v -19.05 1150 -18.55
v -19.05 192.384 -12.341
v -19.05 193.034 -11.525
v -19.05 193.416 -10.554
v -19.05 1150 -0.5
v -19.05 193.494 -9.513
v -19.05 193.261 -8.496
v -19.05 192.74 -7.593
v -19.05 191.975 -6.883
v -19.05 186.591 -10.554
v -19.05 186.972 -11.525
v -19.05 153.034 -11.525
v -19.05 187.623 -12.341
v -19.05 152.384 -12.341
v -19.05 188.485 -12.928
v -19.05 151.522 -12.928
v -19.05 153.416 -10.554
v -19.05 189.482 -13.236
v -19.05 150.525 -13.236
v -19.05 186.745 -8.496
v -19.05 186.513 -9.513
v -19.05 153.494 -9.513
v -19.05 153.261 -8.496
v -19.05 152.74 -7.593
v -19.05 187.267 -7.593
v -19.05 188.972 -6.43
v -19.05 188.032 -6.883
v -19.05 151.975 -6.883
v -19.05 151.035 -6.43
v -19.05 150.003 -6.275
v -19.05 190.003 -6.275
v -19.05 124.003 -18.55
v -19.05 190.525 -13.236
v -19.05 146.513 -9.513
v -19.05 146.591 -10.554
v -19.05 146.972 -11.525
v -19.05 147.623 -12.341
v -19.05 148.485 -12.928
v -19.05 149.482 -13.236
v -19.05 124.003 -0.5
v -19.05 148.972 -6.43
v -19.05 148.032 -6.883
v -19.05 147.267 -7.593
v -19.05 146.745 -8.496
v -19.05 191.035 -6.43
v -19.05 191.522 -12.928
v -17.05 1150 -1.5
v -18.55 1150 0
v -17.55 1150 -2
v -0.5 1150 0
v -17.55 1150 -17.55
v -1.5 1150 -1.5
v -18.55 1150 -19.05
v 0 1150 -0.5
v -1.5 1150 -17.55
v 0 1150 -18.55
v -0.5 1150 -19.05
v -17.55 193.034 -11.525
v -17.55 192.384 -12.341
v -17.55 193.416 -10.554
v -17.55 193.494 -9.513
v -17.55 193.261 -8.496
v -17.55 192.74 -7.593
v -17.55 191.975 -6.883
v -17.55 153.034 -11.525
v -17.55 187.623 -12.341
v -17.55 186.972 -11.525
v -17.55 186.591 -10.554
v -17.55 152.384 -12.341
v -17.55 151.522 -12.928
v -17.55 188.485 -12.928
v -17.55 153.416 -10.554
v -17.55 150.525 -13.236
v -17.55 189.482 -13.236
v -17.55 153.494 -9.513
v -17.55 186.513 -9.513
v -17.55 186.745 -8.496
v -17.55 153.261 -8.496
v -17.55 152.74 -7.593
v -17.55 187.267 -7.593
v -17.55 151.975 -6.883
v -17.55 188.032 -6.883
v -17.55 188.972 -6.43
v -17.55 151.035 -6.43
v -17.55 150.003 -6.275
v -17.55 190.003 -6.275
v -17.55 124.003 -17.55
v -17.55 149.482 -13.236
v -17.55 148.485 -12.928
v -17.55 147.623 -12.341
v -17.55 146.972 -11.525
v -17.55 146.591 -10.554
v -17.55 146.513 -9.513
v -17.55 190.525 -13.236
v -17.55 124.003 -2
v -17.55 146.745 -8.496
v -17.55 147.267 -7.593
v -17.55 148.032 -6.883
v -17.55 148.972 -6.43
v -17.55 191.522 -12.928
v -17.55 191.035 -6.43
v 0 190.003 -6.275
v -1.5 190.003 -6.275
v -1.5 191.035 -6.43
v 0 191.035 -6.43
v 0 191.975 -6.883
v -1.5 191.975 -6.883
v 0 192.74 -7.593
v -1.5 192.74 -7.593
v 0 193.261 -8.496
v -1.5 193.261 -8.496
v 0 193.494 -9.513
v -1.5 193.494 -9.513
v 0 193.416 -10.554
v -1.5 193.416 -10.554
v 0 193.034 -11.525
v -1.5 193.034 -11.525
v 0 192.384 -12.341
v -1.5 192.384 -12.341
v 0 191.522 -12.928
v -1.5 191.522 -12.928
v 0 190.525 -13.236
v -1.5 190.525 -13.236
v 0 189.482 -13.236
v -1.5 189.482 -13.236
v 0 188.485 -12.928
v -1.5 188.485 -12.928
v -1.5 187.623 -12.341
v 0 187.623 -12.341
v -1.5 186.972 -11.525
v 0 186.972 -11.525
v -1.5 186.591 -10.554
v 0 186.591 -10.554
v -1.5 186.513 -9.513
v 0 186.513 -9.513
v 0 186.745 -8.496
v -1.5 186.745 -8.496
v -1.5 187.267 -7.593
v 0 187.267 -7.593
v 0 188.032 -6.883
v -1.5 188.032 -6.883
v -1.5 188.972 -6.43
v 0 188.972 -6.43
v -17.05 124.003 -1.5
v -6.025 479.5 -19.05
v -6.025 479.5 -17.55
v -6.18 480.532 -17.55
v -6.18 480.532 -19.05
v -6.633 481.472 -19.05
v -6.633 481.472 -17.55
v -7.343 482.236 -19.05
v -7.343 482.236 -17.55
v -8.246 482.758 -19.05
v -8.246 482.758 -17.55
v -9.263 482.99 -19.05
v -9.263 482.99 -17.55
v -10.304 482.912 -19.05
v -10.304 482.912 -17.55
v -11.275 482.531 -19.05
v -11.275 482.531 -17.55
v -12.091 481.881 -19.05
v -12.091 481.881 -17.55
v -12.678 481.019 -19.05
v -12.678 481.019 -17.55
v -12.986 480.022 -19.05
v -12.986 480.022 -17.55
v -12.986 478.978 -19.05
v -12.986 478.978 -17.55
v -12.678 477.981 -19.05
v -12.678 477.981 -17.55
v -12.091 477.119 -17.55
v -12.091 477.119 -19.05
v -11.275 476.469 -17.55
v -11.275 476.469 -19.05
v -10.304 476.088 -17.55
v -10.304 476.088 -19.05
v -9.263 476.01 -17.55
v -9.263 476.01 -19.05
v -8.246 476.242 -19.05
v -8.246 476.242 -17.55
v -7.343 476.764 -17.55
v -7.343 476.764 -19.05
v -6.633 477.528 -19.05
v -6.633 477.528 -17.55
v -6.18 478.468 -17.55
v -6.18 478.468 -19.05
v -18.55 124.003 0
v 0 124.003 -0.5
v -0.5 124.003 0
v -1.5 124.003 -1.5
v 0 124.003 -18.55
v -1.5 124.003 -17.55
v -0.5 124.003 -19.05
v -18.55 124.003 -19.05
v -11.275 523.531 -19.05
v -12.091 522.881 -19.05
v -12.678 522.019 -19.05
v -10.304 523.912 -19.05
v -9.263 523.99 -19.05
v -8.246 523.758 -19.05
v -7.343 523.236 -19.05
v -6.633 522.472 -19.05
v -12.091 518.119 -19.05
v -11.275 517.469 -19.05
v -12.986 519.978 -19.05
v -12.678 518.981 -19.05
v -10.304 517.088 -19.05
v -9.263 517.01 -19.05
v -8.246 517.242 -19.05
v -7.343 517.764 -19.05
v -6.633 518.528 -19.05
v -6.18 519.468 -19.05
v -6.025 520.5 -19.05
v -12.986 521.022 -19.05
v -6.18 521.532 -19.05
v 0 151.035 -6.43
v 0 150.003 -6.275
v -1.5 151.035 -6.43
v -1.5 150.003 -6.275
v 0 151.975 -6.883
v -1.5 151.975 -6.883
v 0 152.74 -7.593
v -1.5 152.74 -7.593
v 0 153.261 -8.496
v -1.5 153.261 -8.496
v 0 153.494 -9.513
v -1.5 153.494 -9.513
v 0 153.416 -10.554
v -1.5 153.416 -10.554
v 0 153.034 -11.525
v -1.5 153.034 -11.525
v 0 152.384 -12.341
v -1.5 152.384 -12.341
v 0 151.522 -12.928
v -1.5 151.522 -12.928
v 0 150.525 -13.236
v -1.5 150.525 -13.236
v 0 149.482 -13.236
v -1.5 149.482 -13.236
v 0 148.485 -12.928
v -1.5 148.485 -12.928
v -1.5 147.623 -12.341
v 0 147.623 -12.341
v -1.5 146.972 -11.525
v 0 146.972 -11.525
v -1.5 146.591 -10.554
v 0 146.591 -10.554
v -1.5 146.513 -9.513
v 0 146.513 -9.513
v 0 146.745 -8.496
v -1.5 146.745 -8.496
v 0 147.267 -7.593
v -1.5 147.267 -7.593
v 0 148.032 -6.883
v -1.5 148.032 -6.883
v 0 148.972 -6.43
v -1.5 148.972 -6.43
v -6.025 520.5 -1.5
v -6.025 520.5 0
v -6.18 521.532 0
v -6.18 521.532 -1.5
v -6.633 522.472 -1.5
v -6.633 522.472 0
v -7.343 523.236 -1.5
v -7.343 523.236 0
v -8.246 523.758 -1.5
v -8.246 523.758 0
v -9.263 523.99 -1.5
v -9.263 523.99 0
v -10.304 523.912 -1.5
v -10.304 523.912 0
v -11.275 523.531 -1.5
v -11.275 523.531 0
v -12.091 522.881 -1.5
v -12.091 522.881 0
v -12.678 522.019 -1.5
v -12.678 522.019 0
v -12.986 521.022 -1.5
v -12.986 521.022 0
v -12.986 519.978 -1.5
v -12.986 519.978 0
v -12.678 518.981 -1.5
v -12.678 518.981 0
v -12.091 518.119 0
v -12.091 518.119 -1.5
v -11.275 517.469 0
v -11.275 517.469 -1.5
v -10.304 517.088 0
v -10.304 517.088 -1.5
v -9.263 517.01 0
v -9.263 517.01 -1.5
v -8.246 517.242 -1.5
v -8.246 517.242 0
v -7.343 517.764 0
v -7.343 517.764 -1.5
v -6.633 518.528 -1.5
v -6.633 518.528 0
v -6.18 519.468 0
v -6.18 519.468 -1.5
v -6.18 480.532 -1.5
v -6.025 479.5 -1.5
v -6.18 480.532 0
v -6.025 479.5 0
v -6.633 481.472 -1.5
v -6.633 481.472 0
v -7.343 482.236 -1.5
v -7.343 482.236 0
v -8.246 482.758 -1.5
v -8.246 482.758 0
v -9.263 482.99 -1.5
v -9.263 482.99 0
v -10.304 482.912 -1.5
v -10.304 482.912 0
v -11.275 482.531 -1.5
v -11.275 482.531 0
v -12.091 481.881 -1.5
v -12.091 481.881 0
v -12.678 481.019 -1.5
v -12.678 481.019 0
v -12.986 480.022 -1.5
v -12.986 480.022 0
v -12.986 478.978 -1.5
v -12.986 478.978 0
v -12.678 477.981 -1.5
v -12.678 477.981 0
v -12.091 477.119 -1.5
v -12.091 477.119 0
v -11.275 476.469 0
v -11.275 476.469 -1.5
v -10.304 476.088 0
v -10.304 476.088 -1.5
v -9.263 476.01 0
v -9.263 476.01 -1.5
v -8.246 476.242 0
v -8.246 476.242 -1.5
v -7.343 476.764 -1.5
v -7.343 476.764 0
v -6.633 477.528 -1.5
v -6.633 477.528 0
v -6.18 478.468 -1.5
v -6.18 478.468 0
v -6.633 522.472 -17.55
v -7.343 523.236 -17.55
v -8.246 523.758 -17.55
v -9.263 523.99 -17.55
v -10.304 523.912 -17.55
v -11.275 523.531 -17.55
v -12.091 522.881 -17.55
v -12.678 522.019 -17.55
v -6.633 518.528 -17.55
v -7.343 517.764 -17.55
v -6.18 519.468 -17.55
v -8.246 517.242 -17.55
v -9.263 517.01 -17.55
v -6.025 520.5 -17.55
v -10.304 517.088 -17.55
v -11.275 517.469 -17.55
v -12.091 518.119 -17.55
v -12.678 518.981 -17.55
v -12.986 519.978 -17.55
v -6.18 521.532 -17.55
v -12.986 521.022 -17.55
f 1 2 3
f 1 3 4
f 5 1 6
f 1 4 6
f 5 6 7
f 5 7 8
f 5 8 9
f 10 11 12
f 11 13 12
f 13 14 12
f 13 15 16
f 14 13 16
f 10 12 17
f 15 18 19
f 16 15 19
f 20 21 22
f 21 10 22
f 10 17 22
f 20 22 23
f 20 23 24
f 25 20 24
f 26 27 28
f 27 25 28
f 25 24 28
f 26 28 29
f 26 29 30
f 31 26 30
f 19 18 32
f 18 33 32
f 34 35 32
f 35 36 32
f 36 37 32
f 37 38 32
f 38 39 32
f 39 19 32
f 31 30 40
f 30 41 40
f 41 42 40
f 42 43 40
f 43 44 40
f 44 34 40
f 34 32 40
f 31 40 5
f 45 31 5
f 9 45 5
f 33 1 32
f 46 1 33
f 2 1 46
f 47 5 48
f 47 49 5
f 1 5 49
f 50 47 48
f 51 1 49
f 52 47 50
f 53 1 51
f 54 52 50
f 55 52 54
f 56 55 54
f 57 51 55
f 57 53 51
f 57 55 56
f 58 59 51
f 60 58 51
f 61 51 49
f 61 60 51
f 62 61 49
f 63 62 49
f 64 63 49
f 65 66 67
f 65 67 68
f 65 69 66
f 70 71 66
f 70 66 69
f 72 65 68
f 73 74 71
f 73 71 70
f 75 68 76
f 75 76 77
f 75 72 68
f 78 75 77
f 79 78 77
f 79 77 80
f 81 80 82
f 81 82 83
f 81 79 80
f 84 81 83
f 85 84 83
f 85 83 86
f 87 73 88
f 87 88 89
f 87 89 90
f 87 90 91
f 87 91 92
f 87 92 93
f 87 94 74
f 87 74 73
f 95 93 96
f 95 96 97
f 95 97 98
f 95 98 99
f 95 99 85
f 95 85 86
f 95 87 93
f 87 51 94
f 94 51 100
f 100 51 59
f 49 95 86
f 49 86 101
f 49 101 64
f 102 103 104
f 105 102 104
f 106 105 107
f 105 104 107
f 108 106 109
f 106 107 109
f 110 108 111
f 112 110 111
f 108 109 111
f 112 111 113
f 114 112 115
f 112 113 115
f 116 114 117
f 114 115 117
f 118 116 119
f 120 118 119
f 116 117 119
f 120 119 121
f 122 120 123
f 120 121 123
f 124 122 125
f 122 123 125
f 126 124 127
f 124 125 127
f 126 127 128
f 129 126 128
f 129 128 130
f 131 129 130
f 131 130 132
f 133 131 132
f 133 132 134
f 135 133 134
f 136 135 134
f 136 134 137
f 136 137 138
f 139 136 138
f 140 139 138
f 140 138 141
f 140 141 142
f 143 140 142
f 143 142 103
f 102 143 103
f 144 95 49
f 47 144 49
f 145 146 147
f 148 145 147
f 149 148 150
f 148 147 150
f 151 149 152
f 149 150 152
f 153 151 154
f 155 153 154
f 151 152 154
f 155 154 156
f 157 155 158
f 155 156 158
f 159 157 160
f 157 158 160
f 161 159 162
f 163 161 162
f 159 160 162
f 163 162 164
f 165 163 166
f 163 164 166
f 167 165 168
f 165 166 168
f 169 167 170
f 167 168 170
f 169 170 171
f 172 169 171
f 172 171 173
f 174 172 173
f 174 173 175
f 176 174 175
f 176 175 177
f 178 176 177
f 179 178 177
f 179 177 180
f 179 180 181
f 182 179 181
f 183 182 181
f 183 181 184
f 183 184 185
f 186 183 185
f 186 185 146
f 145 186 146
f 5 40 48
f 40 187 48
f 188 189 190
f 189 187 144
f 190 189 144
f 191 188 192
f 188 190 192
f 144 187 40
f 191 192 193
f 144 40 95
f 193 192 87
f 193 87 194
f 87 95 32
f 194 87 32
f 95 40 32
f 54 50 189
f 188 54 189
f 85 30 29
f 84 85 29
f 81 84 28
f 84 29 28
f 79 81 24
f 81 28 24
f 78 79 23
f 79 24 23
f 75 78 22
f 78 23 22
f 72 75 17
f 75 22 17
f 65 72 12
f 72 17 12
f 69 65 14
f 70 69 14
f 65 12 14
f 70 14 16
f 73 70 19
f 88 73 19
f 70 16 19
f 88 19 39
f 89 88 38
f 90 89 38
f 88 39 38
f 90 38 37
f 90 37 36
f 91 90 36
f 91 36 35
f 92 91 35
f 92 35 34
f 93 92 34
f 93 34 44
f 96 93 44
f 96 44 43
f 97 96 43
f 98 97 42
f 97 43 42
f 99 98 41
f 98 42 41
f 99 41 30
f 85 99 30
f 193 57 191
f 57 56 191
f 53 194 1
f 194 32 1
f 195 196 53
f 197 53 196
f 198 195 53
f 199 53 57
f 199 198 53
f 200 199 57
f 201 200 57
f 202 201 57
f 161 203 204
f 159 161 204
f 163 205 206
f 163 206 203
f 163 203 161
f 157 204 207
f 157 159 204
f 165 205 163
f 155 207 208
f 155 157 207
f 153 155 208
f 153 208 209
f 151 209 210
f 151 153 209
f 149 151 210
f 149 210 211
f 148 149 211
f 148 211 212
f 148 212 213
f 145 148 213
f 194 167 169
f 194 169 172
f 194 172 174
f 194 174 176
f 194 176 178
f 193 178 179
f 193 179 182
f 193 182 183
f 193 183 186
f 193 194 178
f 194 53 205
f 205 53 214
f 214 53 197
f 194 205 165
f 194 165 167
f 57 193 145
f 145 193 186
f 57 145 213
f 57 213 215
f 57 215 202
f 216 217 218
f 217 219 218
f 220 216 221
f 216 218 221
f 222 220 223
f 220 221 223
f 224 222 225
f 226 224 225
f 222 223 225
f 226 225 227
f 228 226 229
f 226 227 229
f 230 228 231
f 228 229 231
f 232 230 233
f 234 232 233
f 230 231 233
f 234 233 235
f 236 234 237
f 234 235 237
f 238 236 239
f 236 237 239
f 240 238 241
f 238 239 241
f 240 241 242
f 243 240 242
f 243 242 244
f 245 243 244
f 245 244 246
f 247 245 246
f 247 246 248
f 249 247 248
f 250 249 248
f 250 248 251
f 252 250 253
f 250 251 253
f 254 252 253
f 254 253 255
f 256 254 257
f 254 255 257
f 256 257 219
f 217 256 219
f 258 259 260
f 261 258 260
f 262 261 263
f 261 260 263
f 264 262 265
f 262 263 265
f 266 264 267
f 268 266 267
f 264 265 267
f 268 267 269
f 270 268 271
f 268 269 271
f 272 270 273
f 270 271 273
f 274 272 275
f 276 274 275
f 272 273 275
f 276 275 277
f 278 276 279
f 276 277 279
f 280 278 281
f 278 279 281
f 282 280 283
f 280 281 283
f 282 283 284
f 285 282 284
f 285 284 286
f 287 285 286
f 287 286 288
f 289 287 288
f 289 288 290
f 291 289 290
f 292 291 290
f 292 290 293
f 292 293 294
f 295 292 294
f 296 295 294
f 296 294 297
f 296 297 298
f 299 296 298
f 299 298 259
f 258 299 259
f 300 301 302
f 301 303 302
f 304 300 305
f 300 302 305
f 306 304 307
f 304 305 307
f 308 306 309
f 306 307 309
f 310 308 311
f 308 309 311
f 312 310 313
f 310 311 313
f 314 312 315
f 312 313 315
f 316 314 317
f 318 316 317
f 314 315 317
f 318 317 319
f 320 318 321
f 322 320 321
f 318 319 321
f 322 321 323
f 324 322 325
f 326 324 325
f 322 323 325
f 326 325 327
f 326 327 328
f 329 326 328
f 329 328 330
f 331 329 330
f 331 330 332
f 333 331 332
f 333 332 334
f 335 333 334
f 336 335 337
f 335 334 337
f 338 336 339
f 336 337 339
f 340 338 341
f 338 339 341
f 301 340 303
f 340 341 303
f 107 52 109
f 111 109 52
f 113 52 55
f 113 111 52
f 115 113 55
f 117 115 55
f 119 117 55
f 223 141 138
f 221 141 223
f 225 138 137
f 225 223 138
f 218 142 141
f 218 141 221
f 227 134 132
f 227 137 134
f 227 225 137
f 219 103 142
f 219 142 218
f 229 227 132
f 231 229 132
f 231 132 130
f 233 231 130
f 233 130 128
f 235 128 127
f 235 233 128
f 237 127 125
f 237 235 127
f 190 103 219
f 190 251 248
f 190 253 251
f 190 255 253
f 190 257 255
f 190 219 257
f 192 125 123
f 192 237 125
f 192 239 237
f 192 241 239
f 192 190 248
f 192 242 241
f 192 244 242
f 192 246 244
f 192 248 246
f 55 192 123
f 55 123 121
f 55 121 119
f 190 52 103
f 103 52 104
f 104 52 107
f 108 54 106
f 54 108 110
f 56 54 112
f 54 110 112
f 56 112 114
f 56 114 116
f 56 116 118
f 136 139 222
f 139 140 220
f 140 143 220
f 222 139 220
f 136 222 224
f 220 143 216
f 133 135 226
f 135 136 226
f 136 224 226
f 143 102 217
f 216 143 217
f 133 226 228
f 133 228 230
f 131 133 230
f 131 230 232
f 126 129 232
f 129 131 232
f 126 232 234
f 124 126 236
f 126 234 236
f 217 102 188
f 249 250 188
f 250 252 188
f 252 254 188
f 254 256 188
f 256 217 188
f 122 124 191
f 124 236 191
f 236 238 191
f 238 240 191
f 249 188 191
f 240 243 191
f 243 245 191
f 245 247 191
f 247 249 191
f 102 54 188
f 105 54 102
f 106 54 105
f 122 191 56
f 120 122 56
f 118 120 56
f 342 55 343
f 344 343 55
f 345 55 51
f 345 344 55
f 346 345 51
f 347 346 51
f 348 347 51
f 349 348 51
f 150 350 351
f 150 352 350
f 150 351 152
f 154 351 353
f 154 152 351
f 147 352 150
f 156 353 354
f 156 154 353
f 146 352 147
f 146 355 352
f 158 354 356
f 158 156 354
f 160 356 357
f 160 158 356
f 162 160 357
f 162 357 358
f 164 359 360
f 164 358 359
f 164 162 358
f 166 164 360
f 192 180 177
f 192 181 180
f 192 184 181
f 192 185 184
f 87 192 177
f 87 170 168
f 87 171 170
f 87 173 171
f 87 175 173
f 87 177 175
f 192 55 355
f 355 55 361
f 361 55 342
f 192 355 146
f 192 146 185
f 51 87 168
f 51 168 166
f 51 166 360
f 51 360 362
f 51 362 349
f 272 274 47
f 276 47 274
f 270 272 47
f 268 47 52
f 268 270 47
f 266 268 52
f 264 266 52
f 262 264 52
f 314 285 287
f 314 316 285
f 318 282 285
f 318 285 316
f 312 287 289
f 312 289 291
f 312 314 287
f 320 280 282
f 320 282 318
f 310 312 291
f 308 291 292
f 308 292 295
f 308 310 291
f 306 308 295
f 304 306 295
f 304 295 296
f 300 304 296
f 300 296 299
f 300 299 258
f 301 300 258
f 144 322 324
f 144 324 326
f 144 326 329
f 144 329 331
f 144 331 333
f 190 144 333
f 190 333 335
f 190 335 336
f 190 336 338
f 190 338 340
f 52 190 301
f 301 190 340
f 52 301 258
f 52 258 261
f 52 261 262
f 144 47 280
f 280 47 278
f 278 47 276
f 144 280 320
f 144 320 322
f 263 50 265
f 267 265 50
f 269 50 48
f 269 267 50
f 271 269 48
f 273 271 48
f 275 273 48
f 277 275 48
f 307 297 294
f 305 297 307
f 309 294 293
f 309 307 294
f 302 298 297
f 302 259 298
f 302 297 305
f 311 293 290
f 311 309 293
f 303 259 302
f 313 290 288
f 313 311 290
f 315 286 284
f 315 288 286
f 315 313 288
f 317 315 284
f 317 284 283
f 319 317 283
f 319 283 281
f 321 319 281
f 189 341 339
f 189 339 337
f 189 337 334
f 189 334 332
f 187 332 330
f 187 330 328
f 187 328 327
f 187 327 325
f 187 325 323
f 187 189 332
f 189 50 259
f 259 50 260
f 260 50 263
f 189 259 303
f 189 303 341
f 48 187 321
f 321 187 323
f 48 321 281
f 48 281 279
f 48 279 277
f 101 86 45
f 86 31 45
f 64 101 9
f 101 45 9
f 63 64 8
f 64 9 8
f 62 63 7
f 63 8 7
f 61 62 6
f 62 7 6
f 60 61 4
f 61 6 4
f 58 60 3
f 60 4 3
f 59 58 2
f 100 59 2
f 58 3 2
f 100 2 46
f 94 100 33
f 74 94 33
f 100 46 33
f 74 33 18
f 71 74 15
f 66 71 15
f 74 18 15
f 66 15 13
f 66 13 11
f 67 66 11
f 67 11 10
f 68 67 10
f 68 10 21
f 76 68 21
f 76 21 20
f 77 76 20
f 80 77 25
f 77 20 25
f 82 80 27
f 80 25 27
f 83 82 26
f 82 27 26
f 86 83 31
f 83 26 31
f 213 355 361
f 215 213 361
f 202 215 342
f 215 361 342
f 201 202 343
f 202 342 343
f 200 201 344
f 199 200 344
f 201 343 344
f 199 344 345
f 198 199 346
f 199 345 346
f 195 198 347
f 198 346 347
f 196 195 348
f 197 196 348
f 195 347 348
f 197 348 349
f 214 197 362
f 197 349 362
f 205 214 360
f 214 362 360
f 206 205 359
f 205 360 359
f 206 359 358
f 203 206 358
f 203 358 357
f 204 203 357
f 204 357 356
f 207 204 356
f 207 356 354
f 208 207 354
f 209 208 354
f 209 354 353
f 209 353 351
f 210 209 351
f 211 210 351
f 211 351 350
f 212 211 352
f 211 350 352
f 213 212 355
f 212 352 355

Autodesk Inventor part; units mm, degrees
ref_plane "YZ Plane" through (0, 0, 0) normal (1, 0, 0) x (0, 1, 0)
ref_plane "XZ Plane" through (0, 0, 0) normal (0, 1, 0) x (-1, 0, 0)
ref_plane "XY Plane" through (0, 0, 0) normal (0, 0, 1) x (1, 0, 0)
sketch "Esboço1" plane through (0, 0, 0) normal (0, 1, 0) x (-1, 0, 0)
  line L0 (0, 0) -> (19.05, 0)
  line L1 (19.05, 0) -> (19.05, -19.05)
  line L2 (19.05, -19.05) -> (0, -19.05)
  line L3 (0, -19.05) -> (0, 0)
  line L4 (17.55, -17.55) -> (17.55, -1.5)
  line L5 (1.5, -1.5) -> (17.55, -1.5)
  line L6 (17.55, -17.55) -> (1.5, -17.55)
  line L7 (1.5, -1.5) -> (1.5, -17.55)
  dimension "d1" = 19.05
  dimension "d2" = 19.05
  dimension "d3" = 19.05
extrude "Extrusão1" add sketch "Esboço1" along normal blind 1000
sketch "Esboço2" plane through (-19.05, 0, -19.05) normal (0, 0, -1) x (-1, 0, 0)
  point P0 (-19.05, 0)
sketch "Esboço3" plane through (0, 0, 0) normal (0, 0, 1) x (1, 0, 0)
  line L0 (-19.05, 0) -> (0, 0) projected
  line L1 (0, 0) -> (-19.05, 0)
  line L2 (-9.525, 0) -> (-9.525, 480)
  circle A0 centre (-9.525, 479.5) radius 3.5
  circle A1 centre (-9.525, 520.5) radius 3.5
  dimension "d15" = 480
  dimension "d56" = 7
  dimension "d57" = 7
extrude "Extrusão2" cut sketch "Esboço3" against normal blind 20
sketch "Esboço6" plane through (0, 1000, 0) normal (0, 1, 0) x (1, 0, 0)
  line L0 (-19.05, 19.05) -> (0, 19.05) projected
  line L1 (0, 0) -> (-19.05, 0) projected
  line L2 (0, 19.05) -> (-19.05, 19.05)
  line L3 (-19.05, 19.05) -> (-19.05, 0)
  line L4 (-19.05, 0) -> (0, 0)
  line L5 (0, 0) -> (0, 19.05)
  line L6 (-17.55, 1.5) -> (-1.5, 1.5) projected
  line L7 (-17.55, 1.5) -> (-1.5, 1.5)
  line L8 (-1.5, 1.5) -> (-1.5, 17.55)
  line L9 (-1.5, 17.55) -> (-17.55, 17.55)
  line L10 (-17.55, 17.55) -> (-17.55, 1.5)
extrude "Extrusão5" add sketch "Esboço6" along normal blind 150
chamfer "Chanfro1" distance 0.5 angle 45 4 edges at (0, 575, 0) (-17.55, 575, -1.5) (-19.05, 575, -19.05) (0, 575, -19.05)
chamfer "Chanfro2" distance 0.5 angle 45 1 edges at (-19.05, 575, 0)
sketch "Esboço7" plane through (-0.5, 0, 0) normal (0, 0, 1) x (1, 0, 0)
  point P0 (0.5, 0)
sketch "Esboço8" plane through (-19.05, 0, -18.55) normal (-1, 0, 0) x (0, 0, 1)
  line L0 (18.55, 1150) -> (16.55, 550.0033)
  line L1 (16.55, 0) -> (16.55, 1150) projected
  line L2 (16.55, 550.0033) -> (16.55, 150.0033)
  line L3 (16.55, 150.0033) -> (1, 150.0033)
  line L4 (1, 0) -> (1, 1150) projected
  line L5 (8.775, 150.0033) -> (8.775, 190.0033)
  circle A0 centre (8.775, 190.0033) radius 3.5
  circle A1 centre (8.775, 150.0033) radius 3.5
  point P0 (18.55, 0)
  dimension "d44" = 600
  dimension "d45" = 400
  dimension "d46" = 40
  dimension "d47" = 7
  dimension "d48" = 7
extrude "Extrusão6" cut sketch "Esboço8" against normal blind 100
sketch "Esboço9" plane through (-19.05, 0, -18.55) normal (-1, 0, 0) x (0, 0, 1)
  circle A0 centre (8.775, 150.0033) radius 3.5 projected
  line L0 (8.775, 150.0033) -> (8.775, 124.0033)
  line L1 (8.775, 124.0033) -> (55.0981, 124.0033)
  line L2 (18.55, 0) -> (-66.7734, 0)
  line L3 (55.0981, 124.0033) -> (-62.8208, 124.0033)
  line L4 (-62.8208, 124.0033) -> (-62.8208, 0)
  line L5 (-62.8208, 0) -> (55.0981, 0)
  line L6 (55.0981, 0) -> (55.0981, 124.0033)
  dimension "d51" = 26
extrude "Extrusão7" cut sketch "Esboço9" against normal blind 100 contours L1 L6 L5 L2 L4 L3
properties part number "suporte sensores 1m" material "Alumínio 6061"
